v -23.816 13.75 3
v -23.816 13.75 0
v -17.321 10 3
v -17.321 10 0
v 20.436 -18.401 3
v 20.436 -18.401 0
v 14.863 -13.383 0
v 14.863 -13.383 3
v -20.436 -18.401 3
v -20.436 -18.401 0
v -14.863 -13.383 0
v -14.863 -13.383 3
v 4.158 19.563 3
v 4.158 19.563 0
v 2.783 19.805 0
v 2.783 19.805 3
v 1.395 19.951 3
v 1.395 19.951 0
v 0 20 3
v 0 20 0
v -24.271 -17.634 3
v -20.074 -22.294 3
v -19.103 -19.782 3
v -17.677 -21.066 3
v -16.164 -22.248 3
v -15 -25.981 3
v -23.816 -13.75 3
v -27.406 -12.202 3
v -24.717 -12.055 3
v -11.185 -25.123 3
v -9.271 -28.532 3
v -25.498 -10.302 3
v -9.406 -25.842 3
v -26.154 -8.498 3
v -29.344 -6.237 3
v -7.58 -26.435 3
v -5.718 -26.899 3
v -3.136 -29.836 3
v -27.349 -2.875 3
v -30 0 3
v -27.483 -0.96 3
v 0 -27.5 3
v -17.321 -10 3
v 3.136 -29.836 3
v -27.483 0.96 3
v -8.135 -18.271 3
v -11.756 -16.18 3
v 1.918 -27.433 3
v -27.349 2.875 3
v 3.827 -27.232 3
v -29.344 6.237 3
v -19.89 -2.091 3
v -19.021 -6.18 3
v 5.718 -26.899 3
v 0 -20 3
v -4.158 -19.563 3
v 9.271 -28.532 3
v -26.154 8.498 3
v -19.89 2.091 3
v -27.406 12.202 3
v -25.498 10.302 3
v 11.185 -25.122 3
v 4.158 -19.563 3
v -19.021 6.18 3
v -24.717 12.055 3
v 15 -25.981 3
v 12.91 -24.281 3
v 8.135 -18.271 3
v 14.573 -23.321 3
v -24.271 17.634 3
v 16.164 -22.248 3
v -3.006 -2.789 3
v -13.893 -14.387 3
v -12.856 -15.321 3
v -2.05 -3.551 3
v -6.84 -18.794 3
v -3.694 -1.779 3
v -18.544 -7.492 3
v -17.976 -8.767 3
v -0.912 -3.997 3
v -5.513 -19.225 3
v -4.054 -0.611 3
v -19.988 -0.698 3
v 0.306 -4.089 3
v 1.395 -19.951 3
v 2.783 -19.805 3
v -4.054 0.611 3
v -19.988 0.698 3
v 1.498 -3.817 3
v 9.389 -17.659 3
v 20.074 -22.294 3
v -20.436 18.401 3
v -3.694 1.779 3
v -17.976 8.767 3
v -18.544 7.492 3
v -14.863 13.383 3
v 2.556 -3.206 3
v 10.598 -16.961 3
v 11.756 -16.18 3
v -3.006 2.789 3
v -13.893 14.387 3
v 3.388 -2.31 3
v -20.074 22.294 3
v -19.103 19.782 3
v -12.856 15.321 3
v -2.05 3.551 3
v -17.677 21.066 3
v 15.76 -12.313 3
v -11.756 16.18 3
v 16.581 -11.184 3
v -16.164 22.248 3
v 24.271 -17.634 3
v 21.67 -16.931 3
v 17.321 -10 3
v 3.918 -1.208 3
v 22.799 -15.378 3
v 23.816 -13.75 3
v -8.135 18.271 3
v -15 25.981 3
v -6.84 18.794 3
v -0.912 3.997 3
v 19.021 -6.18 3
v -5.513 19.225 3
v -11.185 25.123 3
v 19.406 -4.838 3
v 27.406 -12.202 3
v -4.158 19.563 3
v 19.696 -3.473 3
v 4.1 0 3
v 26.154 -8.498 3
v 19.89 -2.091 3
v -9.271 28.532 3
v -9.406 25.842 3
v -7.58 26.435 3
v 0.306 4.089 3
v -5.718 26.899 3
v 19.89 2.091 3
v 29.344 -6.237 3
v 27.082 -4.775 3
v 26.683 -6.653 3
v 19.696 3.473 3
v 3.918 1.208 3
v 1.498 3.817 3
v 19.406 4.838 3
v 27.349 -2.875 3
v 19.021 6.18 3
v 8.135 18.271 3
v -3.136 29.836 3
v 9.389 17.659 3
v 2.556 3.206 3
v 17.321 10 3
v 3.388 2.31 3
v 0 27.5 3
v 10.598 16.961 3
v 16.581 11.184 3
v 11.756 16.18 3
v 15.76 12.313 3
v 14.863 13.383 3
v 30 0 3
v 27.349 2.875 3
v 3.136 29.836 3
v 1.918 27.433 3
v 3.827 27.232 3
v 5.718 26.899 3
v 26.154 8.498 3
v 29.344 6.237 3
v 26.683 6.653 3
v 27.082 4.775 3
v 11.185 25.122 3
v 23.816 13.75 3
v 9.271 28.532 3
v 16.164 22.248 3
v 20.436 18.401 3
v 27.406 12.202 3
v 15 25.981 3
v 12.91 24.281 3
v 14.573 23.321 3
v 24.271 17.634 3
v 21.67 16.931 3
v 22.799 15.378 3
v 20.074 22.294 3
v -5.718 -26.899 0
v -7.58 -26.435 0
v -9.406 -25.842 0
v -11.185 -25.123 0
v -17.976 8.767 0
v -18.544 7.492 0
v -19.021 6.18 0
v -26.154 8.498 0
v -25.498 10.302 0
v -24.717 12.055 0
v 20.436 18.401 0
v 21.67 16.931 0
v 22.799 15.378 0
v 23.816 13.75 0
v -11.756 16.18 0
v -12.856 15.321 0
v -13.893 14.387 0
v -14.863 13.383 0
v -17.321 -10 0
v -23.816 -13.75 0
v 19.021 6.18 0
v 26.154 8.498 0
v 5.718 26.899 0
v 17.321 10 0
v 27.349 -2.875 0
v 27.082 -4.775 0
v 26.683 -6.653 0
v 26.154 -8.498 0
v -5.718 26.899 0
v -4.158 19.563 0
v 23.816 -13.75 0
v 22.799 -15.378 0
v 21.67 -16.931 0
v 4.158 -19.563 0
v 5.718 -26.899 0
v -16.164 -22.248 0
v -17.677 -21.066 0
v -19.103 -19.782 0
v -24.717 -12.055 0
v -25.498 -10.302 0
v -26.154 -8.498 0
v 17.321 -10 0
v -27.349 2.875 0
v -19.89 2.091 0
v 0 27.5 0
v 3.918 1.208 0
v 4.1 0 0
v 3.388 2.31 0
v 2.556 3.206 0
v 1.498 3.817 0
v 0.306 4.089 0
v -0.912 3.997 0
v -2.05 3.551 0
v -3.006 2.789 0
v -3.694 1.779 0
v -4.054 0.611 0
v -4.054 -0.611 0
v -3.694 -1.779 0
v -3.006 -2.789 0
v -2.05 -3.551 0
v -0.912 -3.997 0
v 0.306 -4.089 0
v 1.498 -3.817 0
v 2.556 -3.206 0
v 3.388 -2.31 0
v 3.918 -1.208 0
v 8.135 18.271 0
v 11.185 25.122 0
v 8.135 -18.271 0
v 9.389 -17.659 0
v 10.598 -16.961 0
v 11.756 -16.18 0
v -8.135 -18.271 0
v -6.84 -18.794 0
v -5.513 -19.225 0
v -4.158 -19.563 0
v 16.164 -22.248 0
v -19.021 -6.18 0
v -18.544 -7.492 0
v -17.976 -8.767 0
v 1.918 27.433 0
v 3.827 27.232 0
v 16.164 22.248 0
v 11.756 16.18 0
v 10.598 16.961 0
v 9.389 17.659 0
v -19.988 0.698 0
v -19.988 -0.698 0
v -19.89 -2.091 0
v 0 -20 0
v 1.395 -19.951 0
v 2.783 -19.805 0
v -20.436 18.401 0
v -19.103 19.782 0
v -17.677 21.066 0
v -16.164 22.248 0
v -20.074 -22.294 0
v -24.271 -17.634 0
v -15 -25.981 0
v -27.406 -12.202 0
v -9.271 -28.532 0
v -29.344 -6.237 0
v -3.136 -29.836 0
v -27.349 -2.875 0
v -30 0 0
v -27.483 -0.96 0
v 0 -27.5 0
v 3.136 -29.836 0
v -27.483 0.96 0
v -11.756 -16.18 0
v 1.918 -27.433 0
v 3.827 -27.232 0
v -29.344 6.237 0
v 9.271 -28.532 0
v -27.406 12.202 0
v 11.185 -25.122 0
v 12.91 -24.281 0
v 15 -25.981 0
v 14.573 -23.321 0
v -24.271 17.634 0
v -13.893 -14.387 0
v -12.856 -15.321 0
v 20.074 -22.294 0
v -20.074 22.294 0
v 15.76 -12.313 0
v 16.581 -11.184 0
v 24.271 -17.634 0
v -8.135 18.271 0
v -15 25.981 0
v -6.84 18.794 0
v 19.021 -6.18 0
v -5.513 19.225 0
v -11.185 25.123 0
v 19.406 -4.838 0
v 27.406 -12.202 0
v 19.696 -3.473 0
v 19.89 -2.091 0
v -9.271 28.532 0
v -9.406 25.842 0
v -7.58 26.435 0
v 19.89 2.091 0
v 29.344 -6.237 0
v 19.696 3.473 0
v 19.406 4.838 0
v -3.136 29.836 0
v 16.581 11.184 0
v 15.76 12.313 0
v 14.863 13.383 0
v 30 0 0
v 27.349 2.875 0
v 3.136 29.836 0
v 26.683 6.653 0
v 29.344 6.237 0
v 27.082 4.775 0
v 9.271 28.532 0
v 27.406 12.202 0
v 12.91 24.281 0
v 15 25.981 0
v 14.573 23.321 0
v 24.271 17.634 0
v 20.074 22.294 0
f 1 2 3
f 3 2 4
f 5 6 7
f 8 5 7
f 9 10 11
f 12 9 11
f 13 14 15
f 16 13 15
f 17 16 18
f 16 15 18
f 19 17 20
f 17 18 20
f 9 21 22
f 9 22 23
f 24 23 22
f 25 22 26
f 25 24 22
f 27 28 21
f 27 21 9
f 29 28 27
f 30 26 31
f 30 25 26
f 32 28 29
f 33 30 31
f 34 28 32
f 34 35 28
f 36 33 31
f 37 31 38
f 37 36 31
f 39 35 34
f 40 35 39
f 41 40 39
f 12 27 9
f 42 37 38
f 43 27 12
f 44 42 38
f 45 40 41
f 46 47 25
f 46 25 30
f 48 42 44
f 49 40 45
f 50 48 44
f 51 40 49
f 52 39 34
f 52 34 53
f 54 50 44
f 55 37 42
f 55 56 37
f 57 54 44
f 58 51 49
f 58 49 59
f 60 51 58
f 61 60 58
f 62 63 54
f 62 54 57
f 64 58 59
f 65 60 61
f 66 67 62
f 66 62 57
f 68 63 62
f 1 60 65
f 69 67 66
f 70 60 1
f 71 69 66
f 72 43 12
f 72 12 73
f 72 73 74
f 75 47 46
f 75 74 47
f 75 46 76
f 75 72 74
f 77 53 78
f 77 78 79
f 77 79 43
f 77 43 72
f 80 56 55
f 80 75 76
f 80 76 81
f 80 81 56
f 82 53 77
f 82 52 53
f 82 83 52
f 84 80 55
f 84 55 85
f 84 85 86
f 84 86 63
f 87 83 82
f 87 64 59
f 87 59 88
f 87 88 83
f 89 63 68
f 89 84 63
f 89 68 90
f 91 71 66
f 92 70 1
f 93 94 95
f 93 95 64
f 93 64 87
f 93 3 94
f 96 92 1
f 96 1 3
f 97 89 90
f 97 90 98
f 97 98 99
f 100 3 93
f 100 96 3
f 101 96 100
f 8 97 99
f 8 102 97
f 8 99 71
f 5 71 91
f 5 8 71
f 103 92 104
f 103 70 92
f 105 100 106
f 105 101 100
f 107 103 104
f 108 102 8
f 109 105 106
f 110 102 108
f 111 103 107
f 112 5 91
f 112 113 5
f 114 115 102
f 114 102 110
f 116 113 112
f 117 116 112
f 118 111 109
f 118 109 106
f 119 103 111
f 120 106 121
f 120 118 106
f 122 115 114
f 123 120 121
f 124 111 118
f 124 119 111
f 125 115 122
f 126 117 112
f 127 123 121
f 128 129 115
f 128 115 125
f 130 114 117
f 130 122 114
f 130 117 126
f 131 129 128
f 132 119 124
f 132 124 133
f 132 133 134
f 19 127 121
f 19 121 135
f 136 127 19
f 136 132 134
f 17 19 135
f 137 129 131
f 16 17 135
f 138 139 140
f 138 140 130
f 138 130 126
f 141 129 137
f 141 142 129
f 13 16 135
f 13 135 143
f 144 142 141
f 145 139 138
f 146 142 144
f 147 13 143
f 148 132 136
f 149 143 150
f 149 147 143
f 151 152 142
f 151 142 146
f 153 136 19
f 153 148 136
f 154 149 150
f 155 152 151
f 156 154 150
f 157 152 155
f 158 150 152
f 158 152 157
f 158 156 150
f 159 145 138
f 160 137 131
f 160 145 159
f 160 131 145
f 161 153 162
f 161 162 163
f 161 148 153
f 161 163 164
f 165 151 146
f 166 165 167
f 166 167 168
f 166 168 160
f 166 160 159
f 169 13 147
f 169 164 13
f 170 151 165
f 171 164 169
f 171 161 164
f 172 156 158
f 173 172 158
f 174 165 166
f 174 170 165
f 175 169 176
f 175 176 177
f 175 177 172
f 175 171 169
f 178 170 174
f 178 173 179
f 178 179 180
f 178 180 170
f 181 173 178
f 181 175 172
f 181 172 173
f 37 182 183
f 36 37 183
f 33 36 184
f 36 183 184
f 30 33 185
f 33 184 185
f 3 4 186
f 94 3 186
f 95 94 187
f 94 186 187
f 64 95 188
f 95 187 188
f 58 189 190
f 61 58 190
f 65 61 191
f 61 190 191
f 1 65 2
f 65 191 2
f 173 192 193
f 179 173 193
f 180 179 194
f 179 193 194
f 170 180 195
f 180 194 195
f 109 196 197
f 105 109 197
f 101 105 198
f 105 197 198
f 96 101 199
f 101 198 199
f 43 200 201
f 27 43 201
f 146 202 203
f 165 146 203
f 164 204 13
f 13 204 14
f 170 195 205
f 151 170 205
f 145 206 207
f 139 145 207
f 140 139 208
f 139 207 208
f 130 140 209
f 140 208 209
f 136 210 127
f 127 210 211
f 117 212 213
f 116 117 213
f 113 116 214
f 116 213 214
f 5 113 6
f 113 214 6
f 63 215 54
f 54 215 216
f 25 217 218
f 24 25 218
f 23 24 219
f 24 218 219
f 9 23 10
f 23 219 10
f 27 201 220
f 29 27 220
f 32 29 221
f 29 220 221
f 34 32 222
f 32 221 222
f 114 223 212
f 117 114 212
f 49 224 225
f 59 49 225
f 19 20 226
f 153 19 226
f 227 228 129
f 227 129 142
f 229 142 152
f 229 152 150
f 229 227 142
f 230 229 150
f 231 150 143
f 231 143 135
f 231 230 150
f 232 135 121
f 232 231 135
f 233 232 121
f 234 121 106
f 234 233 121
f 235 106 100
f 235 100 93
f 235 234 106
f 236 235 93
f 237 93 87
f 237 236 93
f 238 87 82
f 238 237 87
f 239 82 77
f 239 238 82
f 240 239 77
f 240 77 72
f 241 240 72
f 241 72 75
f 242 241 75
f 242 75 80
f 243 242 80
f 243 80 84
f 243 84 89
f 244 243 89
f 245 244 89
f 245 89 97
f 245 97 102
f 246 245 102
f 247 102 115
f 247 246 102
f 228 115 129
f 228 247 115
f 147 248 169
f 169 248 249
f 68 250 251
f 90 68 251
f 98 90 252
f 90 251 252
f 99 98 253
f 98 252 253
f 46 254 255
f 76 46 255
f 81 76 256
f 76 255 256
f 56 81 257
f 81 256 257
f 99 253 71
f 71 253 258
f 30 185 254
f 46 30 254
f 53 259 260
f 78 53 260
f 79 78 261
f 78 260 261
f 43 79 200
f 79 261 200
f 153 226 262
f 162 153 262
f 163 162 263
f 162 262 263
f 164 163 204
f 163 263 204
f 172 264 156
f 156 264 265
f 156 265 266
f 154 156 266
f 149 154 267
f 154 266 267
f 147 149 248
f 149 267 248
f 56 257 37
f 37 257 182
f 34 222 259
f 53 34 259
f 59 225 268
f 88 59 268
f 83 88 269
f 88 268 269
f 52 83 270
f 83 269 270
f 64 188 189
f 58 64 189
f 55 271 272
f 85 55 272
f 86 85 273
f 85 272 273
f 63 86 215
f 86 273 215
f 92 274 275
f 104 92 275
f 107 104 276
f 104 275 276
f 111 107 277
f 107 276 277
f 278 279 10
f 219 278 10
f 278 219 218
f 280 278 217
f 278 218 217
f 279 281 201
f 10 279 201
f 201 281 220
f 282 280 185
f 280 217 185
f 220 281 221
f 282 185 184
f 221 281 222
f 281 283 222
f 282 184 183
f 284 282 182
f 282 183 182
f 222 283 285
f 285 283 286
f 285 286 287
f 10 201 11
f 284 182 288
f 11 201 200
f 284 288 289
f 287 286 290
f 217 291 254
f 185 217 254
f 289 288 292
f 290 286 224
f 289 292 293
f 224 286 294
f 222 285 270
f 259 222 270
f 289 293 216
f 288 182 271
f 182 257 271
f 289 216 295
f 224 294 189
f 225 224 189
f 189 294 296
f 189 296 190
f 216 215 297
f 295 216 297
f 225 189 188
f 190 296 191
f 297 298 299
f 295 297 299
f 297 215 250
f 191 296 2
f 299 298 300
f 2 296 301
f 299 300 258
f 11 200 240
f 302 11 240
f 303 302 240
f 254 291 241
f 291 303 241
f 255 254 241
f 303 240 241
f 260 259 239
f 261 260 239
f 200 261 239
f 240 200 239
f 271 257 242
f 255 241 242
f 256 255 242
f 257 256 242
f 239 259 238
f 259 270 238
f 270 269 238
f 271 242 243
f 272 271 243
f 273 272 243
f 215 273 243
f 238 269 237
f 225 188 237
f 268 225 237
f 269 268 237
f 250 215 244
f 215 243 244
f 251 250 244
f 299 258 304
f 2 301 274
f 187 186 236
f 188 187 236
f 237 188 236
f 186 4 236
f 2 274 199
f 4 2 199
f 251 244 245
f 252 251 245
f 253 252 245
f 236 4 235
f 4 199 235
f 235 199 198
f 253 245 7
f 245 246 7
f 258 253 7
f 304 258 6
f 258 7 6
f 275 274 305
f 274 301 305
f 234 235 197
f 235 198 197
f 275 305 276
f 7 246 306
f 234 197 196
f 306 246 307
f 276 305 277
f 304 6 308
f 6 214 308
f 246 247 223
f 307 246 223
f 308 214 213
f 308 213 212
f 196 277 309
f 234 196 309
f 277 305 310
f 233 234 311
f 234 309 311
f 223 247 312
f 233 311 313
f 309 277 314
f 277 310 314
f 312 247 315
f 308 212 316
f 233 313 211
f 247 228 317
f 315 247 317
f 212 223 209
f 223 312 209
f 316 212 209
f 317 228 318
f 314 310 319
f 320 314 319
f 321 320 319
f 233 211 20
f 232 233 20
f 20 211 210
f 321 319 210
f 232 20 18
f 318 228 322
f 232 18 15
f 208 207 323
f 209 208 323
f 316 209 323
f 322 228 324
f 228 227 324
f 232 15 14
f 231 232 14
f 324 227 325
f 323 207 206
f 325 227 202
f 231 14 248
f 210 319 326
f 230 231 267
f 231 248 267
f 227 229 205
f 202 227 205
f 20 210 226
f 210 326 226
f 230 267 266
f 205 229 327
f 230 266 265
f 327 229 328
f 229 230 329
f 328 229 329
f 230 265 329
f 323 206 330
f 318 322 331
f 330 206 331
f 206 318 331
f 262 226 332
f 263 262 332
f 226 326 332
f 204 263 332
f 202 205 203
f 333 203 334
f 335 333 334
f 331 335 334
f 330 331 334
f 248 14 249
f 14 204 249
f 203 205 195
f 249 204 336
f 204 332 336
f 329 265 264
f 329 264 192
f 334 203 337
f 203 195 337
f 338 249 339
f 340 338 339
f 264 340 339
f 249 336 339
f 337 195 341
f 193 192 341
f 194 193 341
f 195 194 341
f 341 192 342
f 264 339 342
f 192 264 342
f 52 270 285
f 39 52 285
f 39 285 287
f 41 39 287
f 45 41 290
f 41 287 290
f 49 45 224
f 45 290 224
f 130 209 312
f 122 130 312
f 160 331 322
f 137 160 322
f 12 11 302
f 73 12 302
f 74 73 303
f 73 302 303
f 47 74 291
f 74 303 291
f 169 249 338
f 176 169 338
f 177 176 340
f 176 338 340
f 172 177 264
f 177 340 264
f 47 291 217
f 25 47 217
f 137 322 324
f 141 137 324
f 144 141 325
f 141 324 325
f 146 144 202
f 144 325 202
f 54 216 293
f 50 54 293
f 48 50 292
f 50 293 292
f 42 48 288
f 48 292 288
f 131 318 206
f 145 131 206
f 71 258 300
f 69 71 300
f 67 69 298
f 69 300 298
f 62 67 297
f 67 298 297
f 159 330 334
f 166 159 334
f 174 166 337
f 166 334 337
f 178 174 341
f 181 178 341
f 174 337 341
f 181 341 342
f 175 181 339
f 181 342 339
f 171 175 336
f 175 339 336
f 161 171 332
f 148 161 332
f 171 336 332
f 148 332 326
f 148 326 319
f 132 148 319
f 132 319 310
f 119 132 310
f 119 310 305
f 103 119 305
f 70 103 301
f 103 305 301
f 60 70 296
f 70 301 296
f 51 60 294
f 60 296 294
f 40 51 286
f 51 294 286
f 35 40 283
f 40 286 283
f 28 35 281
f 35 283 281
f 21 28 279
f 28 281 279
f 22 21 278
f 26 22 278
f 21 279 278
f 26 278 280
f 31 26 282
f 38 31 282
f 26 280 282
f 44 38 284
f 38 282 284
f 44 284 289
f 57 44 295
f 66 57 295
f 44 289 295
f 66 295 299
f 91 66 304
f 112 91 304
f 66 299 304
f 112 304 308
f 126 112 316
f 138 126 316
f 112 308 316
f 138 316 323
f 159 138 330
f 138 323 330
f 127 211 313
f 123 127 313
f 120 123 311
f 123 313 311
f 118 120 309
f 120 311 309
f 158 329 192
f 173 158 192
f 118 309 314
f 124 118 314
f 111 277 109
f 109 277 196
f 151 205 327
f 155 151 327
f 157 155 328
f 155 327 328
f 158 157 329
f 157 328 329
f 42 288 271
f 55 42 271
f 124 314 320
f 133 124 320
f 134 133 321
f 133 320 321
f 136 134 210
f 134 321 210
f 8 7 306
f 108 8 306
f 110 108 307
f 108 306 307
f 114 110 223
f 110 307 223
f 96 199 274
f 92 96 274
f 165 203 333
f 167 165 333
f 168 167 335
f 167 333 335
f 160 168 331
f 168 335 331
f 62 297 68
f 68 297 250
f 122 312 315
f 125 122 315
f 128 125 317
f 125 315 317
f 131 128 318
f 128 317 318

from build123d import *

# Parameters (mm, degrees)
F0_R     = 30
F0_R_2   = 4.1
F1_DEPTH = 3


with BuildPart() as f1:
    # F0 (on Top) → F1 (new body)
    with BuildSketch(Plane.XY):
        Circle(F0_R)
        with BuildLine():
            ThreePointArc((-16.164094, -22.247967), (-18.401092, -20.436483), (-20.436483, -18.401092))
            Line((-20.436483, -18.401092), (-14.862897, -13.382612))
            ThreePointArc((-14.862897, -13.382612), (-13.382612, -14.862897), (-11.755705, -16.18034))
            Line((-11.755705, -16.18034), (-16.164094, -22.247967))
        make_face(mode=Mode.SUBTRACT)
        with BuildLine():
            ThreePointArc((-5.717571, -26.899059), (-8.497967, -26.154054), (-11.185258, -25.1225))
            Line((-11.185258, -25.1225), (-8.134733, -18.270909))
            ThreePointArc((-8.134733, -18.270909), (-6.18034, -19.02113), (-4.158234, -19.562952))
            Line((-4.158234, -19.562952), (-5.717571, -26.899059))
        make_face(mode=Mode.SUBTRACT)
        with BuildLine():
            ThreePointArc((-23.815699, -13.75), (-25.1225, -11.185258), (-26.154054, -8.497967))
            Line((-26.154054, -8.497967), (-19.02113, -6.18034))
            ThreePointArc((-19.02113, -6.18034), (-18.270909, -8.134733), (-17.320508, -10))
            Line((-17.320508, -10), (-23.815699, -13.75))
        make_face(mode=Mode.SUBTRACT)
        with BuildLine():
            ThreePointArc((5.717571, -26.899059), (2.874533, -27.349352), (0, -27.5))
            Line((0, -27.5), (0, -20))
            ThreePointArc((0, -20), (2.090569, -19.890438), (4.158234, -19.562952))
            Line((4.158234, -19.562952), (5.717571, -26.899059))
        make_face(mode=Mode.SUBTRACT)
        with BuildLine():
            ThreePointArc((16.164094, -22.247967), (13.75, -23.815699), (11.185258, -25.1225))
            Line((11.185258, -25.1225), (8.134733, -18.270909))
            ThreePointArc((8.134733, -18.270909), (10, -17.320508), (11.755705, -16.18034))
            Line((11.755705, -16.18034), (16.164094, -22.247967))
        make_face(mode=Mode.SUBTRACT)
        with BuildLine():
            ThreePointArc((23.815699, -13.75), (22.247967, -16.164094), (20.436483, -18.401092))
            Line((20.436483, -18.401092), (14.862897, -13.382612))
            ThreePointArc((14.862897, -13.382612), (16.18034, -11.755705), (17.320508, -10))
            Line((17.320508, -10), (23.815699, -13.75))
        make_face(mode=Mode.SUBTRACT)
        with BuildLine():
            ThreePointArc((27.349352, -2.874533), (26.899059, -5.717571), (26.154054, -8.497967))
            Line((26.154054, -8.497967), (19.02113, -6.18034))
            ThreePointArc((19.02113, -6.18034), (19.562952, -4.158234), (19.890438, -2.090569))
            Line((19.890438, -2.090569), (27.349352, -2.874533))
        make_face(mode=Mode.SUBTRACT)
        with BuildLine():
            ThreePointArc((-27.349352, -2.874533), (-27.5, 0), (-27.349352, 2.874533))
            Line((-27.349352, 2.874533), (-19.890438, 2.090569))
            ThreePointArc((-19.890438, 2.090569), (-20, 0), (-19.890438, -2.090569))
            Line((-19.890438, -2.090569), (-27.349352, -2.874533))
        make_face(mode=Mode.SUBTRACT)
        with BuildLine():
            ThreePointArc((-26.154054, 8.497967), (-25.1225, 11.185258), (-23.815699, 13.75))
            Line((-23.815699, 13.75), (-17.320508, 10))
            ThreePointArc((-17.320508, 10), (-18.270909, 8.134733), (-19.02113, 6.18034))
            Line((-19.02113, 6.18034), (-26.154054, 8.497967))
        make_face(mode=Mode.SUBTRACT)
        with BuildLine():
            ThreePointArc((-20.436483, 18.401092), (-18.401092, 20.436483), (-16.164094, 22.247967))
            Line((-16.164094, 22.247967), (-11.755705, 16.18034))
            ThreePointArc((-11.755705, 16.18034), (-13.382612, 14.862897), (-14.862897, 13.382612))
            Line((-14.862897, 13.382612), (-20.436483, 18.401092))
        make_face(mode=Mode.SUBTRACT)
        with BuildLine():
            ThreePointArc((-11.185258, 25.1225), (-8.497967, 26.154054), (-5.717571, 26.899059))
            Line((-5.717571, 26.899059), (-4.158234, 19.562952))
            ThreePointArc((-4.158234, 19.562952), (-6.18034, 19.02113), (-8.134733, 18.270909))
            Line((-8.134733, 18.270909), (-11.185258, 25.1225))
        make_face(mode=Mode.SUBTRACT)
        Circle(F0_R_2, mode=Mode.SUBTRACT)
        with BuildLine():
            ThreePointArc((26.154054, 8.497967), (26.899059, 5.717571), (27.349352, 2.874533))
            Line((27.349352, 2.874533), (19.890438, 2.090569))
            ThreePointArc((19.890438, 2.090569), (19.562952, 4.158234), (19.02113, 6.18034))
            Line((19.02113, 6.18034), (26.154054, 8.497967))
        make_face(mode=Mode.SUBTRACT)
        with BuildLine():
            ThreePointArc((20.436483, 18.401092), (22.247967, 16.164094), (23.815699, 13.75))
            Line((23.815699, 13.75), (17.320508, 10))
            ThreePointArc((17.320508, 10), (16.18034, 11.755705), (14.862897, 13.382612))
            Line((14.862897, 13.382612), (20.436483, 18.401092))
        make_face(mode=Mode.SUBTRACT)
        with BuildLine():
            ThreePointArc((11.185258, 25.1225), (13.75, 23.815699), (16.164094, 22.247967))
            Line((16.164094, 22.247967), (11.755705, 16.18034))
            ThreePointArc((11.755705, 16.18034), (10, 17.320508), (8.134733, 18.270909))
            Line((8.134733, 18.270909), (11.185258, 25.1225))
        make_face(mode=Mode.SUBTRACT)
        with BuildLine():
            Line((0, 20), (0, 27.5))
            ThreePointArc((0, 27.5), (2.874533, 27.349352), (5.717571, 26.899059))
            Line((5.717571, 26.899059), (4.158234, 19.562952))
            ThreePointArc((4.158234, 19.562952), (2.090569, 19.890438), (0, 20))
        make_face(mode=Mode.SUBTRACT)
    extrude(amount=F1_DEPTH)


solid = f1.part
